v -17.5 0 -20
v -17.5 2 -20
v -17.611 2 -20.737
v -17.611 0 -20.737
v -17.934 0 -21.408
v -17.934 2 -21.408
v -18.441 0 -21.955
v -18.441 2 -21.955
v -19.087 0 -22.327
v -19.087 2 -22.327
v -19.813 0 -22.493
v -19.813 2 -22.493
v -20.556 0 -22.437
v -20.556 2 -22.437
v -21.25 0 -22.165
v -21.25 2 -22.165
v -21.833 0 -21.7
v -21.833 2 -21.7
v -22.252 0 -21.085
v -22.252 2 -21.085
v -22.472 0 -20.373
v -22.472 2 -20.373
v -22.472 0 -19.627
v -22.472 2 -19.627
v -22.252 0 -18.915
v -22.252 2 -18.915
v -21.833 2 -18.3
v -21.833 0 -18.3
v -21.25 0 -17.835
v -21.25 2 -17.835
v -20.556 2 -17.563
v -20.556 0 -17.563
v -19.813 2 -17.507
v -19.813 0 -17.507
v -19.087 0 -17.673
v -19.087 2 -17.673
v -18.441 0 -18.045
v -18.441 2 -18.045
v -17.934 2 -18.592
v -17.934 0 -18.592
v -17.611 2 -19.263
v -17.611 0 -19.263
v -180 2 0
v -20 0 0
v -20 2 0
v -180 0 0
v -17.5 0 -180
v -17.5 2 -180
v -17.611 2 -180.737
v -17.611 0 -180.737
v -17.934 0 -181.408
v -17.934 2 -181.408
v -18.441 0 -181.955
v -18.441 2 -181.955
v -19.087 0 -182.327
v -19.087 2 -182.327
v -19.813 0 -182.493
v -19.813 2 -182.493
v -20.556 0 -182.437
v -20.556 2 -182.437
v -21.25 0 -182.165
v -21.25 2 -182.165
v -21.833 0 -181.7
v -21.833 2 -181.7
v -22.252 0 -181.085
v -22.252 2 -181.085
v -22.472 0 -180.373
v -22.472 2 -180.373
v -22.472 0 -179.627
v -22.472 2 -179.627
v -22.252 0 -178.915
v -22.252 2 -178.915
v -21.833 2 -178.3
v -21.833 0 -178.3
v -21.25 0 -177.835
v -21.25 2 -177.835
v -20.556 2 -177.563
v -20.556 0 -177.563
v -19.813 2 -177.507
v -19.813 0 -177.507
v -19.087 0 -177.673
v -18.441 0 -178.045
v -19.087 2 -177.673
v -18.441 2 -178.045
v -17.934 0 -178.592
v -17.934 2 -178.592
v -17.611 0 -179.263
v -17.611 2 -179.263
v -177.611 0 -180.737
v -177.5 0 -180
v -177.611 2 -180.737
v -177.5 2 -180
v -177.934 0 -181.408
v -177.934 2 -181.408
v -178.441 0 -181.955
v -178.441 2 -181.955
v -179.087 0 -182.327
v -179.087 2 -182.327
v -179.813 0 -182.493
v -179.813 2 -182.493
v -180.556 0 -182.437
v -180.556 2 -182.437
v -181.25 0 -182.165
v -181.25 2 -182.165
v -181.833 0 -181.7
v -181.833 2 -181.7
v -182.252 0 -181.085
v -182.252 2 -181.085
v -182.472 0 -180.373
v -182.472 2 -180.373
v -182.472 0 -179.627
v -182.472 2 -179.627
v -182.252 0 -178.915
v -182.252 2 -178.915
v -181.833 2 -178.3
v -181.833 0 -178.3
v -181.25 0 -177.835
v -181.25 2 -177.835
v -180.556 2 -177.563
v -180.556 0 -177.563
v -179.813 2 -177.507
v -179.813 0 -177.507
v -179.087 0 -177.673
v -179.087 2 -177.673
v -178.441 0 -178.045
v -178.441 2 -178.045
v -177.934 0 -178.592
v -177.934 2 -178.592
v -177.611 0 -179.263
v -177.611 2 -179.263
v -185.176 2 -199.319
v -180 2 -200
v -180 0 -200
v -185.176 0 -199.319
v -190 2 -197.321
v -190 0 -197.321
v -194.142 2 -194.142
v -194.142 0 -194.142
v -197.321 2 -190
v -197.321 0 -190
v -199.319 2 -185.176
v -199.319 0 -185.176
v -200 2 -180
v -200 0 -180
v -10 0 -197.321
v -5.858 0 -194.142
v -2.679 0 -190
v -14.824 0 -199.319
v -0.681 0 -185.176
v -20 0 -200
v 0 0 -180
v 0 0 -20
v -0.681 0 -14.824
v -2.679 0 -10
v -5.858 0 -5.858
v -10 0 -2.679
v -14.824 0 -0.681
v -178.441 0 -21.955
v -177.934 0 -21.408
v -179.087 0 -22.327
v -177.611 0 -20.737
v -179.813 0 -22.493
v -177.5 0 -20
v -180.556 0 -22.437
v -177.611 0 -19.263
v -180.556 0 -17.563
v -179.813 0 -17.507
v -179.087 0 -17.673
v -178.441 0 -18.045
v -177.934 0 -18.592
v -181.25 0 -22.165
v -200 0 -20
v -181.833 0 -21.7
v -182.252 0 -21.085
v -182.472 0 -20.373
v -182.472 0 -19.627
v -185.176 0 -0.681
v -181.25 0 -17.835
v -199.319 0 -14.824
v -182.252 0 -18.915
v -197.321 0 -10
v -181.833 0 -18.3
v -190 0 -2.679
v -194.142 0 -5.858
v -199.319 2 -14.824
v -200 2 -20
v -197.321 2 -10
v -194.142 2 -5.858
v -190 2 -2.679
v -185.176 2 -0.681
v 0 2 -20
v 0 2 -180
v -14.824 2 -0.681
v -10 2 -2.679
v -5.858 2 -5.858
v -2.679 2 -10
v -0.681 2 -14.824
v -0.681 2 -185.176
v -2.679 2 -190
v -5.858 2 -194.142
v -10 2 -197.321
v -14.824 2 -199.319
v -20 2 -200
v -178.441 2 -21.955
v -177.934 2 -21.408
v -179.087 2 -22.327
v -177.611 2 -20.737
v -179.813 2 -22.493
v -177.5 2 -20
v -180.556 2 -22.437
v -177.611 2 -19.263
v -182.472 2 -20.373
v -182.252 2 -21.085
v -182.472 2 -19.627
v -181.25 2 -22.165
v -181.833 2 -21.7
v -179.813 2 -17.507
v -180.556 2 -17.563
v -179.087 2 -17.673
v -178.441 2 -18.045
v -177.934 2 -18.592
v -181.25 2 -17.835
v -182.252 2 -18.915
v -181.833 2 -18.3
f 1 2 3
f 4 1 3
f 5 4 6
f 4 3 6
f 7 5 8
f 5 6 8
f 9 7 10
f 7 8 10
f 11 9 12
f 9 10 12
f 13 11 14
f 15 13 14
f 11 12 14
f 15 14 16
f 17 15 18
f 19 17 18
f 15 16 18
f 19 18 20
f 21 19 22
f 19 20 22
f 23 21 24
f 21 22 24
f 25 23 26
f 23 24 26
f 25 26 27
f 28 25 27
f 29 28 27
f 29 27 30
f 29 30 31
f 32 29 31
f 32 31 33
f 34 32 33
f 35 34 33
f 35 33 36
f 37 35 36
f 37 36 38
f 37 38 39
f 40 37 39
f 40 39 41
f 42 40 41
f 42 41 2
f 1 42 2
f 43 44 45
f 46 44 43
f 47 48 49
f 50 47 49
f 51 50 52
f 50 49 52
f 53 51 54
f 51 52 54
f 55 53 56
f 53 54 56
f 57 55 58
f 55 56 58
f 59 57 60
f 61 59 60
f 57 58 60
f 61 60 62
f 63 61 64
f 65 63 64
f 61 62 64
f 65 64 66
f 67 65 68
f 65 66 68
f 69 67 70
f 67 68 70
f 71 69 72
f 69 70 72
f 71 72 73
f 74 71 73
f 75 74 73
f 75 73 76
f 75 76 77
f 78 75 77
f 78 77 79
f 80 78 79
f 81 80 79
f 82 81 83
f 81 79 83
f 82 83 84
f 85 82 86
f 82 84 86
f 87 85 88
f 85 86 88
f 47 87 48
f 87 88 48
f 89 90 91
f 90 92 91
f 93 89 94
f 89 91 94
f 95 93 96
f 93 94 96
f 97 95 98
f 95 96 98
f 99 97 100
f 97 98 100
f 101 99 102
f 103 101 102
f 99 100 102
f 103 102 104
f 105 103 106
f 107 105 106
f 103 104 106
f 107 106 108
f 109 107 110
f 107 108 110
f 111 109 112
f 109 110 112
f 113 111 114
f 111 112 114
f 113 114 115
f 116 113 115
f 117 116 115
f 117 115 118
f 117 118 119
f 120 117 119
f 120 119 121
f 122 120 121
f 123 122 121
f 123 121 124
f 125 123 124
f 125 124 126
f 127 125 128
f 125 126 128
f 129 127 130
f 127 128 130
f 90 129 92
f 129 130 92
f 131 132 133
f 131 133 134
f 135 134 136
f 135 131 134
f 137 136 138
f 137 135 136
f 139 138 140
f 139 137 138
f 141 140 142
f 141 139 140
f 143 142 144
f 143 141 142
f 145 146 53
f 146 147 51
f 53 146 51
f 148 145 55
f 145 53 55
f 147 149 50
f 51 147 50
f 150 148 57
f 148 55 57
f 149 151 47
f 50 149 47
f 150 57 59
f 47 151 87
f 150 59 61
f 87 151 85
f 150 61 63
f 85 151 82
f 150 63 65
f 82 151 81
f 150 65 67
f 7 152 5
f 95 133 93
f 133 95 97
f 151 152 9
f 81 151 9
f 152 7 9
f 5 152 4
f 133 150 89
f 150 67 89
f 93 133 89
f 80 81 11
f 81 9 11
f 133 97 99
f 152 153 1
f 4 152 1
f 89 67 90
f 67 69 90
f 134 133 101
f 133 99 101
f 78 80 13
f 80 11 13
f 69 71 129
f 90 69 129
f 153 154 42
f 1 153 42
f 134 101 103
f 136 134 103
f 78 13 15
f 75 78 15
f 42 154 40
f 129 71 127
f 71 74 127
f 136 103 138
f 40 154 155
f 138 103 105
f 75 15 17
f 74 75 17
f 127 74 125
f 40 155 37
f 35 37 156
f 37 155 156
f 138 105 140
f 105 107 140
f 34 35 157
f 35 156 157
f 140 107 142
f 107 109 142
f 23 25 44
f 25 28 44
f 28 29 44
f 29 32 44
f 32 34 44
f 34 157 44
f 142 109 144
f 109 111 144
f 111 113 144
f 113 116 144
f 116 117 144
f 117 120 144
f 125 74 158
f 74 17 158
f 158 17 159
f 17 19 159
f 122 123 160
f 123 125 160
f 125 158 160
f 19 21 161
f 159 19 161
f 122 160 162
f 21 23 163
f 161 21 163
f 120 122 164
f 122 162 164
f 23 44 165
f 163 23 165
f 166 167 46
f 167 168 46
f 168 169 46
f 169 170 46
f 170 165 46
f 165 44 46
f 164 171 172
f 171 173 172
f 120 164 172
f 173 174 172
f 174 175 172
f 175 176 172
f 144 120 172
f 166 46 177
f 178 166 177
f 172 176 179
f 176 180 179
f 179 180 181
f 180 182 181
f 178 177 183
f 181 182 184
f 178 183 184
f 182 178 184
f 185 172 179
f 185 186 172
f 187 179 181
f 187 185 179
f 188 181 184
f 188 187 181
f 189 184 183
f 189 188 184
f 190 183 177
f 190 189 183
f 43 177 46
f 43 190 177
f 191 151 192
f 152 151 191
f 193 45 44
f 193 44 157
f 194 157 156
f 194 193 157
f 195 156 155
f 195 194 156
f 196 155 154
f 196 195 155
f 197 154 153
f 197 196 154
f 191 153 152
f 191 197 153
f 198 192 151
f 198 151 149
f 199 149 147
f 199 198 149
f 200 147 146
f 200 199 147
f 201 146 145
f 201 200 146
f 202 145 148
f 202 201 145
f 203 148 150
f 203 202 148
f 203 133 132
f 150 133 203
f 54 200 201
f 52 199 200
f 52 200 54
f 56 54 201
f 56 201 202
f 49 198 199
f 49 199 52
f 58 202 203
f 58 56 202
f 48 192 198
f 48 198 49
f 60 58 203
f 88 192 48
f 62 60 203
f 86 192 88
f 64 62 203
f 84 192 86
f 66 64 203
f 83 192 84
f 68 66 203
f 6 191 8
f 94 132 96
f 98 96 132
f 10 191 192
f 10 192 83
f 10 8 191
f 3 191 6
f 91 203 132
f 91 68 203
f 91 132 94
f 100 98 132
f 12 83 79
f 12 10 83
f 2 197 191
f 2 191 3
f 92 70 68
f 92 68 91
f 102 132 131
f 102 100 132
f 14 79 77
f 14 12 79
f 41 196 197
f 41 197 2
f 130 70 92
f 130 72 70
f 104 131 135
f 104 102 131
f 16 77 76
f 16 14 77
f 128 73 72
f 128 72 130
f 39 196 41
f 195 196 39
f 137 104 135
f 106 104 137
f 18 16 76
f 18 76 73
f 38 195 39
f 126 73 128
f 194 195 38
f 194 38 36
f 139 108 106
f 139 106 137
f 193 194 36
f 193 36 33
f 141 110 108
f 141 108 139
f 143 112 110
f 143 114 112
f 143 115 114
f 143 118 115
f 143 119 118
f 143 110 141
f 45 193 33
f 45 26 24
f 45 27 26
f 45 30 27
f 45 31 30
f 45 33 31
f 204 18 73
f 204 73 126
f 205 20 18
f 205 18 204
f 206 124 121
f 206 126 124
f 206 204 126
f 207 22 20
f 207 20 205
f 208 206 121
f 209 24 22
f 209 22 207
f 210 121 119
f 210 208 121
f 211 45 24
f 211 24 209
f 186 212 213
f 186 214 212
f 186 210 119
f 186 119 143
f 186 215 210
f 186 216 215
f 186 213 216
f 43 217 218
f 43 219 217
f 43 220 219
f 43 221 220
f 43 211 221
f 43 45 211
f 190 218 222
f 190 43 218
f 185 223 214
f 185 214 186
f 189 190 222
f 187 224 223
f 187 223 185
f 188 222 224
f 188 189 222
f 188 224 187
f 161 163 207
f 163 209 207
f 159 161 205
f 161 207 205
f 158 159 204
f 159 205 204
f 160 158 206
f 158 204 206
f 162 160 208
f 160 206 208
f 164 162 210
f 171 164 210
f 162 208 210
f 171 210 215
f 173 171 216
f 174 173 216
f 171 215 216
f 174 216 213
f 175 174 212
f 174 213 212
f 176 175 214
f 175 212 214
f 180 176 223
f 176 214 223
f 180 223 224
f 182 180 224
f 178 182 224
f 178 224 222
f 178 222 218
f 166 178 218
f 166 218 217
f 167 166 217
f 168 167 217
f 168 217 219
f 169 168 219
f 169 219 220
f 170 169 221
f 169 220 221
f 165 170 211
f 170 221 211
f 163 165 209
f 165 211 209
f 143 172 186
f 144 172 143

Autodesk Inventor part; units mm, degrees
ref_plane "YZ Plane" through (0, 0, 0) normal (1, 0, 0) x (0, 1, 0)
ref_plane "XZ Plane" through (0, 0, 0) normal (0, 1, 0) x (-1, 0, 0)
ref_plane "XY Plane" through (0, 0, 0) normal (0, 0, 1) x (1, 0, 0)
sketch "Sketch1" plane through (0, 0, 0) normal (0, 1, 0) x (-1, 0, 0)
  line L0 (0, 0) -> (200, 0)
  line L1 (200, 0) -> (200, -200)
  line L2 (200, -200) -> (0, -200)
  line L3 (0, -200) -> (0, 0)
  dimension "d0" = 200
  dimension "d1" = 200
extrude "Extrusion1" add sketch "Sketch1" along normal blind 2
fillet "Fillet1" radius 20 4 edges at (-200, 1, 0) (0, 1, 0) (0, 1, -200) (-200, 1, -200)
sketch "Sketch4" plane through (0, 2, 0) normal (0, 1, 0) x (1, 0, 0)
  arc A0 (-20, 0) -> (0, 20) centre (-20, 20) ccw projected
  arc A1 (-200, 20) -> (-180, 0) centre (-180, 20) ccw projected
  arc A2 (0, 180) -> (-20, 200) centre (-20, 180) ccw projected
  arc A3 (-180, 200) -> (-200, 180) centre (-180, 180) ccw projected
  circle A4 centre (-20, 180) radius 2.5
  circle A5 centre (-180, 180) radius 2.5
  circle A6 centre (-180, 20) radius 2.5
  circle A7 centre (-20, 20) radius 2.5
  line L0 (-180, 0) -> (-20, 0) projected
  line L1 (0, 20) -> (0, 180) projected
  point P0 (0, 0)
  dimension "d19" = 5
  dimension "d20" = 5
  dimension "d21" = 5
  dimension "d22" = 5
extrude "Extrusion4" cut sketch "Sketch4" against normal blind 2
properties part number "Basequadrada" material "PPS Plastic"
